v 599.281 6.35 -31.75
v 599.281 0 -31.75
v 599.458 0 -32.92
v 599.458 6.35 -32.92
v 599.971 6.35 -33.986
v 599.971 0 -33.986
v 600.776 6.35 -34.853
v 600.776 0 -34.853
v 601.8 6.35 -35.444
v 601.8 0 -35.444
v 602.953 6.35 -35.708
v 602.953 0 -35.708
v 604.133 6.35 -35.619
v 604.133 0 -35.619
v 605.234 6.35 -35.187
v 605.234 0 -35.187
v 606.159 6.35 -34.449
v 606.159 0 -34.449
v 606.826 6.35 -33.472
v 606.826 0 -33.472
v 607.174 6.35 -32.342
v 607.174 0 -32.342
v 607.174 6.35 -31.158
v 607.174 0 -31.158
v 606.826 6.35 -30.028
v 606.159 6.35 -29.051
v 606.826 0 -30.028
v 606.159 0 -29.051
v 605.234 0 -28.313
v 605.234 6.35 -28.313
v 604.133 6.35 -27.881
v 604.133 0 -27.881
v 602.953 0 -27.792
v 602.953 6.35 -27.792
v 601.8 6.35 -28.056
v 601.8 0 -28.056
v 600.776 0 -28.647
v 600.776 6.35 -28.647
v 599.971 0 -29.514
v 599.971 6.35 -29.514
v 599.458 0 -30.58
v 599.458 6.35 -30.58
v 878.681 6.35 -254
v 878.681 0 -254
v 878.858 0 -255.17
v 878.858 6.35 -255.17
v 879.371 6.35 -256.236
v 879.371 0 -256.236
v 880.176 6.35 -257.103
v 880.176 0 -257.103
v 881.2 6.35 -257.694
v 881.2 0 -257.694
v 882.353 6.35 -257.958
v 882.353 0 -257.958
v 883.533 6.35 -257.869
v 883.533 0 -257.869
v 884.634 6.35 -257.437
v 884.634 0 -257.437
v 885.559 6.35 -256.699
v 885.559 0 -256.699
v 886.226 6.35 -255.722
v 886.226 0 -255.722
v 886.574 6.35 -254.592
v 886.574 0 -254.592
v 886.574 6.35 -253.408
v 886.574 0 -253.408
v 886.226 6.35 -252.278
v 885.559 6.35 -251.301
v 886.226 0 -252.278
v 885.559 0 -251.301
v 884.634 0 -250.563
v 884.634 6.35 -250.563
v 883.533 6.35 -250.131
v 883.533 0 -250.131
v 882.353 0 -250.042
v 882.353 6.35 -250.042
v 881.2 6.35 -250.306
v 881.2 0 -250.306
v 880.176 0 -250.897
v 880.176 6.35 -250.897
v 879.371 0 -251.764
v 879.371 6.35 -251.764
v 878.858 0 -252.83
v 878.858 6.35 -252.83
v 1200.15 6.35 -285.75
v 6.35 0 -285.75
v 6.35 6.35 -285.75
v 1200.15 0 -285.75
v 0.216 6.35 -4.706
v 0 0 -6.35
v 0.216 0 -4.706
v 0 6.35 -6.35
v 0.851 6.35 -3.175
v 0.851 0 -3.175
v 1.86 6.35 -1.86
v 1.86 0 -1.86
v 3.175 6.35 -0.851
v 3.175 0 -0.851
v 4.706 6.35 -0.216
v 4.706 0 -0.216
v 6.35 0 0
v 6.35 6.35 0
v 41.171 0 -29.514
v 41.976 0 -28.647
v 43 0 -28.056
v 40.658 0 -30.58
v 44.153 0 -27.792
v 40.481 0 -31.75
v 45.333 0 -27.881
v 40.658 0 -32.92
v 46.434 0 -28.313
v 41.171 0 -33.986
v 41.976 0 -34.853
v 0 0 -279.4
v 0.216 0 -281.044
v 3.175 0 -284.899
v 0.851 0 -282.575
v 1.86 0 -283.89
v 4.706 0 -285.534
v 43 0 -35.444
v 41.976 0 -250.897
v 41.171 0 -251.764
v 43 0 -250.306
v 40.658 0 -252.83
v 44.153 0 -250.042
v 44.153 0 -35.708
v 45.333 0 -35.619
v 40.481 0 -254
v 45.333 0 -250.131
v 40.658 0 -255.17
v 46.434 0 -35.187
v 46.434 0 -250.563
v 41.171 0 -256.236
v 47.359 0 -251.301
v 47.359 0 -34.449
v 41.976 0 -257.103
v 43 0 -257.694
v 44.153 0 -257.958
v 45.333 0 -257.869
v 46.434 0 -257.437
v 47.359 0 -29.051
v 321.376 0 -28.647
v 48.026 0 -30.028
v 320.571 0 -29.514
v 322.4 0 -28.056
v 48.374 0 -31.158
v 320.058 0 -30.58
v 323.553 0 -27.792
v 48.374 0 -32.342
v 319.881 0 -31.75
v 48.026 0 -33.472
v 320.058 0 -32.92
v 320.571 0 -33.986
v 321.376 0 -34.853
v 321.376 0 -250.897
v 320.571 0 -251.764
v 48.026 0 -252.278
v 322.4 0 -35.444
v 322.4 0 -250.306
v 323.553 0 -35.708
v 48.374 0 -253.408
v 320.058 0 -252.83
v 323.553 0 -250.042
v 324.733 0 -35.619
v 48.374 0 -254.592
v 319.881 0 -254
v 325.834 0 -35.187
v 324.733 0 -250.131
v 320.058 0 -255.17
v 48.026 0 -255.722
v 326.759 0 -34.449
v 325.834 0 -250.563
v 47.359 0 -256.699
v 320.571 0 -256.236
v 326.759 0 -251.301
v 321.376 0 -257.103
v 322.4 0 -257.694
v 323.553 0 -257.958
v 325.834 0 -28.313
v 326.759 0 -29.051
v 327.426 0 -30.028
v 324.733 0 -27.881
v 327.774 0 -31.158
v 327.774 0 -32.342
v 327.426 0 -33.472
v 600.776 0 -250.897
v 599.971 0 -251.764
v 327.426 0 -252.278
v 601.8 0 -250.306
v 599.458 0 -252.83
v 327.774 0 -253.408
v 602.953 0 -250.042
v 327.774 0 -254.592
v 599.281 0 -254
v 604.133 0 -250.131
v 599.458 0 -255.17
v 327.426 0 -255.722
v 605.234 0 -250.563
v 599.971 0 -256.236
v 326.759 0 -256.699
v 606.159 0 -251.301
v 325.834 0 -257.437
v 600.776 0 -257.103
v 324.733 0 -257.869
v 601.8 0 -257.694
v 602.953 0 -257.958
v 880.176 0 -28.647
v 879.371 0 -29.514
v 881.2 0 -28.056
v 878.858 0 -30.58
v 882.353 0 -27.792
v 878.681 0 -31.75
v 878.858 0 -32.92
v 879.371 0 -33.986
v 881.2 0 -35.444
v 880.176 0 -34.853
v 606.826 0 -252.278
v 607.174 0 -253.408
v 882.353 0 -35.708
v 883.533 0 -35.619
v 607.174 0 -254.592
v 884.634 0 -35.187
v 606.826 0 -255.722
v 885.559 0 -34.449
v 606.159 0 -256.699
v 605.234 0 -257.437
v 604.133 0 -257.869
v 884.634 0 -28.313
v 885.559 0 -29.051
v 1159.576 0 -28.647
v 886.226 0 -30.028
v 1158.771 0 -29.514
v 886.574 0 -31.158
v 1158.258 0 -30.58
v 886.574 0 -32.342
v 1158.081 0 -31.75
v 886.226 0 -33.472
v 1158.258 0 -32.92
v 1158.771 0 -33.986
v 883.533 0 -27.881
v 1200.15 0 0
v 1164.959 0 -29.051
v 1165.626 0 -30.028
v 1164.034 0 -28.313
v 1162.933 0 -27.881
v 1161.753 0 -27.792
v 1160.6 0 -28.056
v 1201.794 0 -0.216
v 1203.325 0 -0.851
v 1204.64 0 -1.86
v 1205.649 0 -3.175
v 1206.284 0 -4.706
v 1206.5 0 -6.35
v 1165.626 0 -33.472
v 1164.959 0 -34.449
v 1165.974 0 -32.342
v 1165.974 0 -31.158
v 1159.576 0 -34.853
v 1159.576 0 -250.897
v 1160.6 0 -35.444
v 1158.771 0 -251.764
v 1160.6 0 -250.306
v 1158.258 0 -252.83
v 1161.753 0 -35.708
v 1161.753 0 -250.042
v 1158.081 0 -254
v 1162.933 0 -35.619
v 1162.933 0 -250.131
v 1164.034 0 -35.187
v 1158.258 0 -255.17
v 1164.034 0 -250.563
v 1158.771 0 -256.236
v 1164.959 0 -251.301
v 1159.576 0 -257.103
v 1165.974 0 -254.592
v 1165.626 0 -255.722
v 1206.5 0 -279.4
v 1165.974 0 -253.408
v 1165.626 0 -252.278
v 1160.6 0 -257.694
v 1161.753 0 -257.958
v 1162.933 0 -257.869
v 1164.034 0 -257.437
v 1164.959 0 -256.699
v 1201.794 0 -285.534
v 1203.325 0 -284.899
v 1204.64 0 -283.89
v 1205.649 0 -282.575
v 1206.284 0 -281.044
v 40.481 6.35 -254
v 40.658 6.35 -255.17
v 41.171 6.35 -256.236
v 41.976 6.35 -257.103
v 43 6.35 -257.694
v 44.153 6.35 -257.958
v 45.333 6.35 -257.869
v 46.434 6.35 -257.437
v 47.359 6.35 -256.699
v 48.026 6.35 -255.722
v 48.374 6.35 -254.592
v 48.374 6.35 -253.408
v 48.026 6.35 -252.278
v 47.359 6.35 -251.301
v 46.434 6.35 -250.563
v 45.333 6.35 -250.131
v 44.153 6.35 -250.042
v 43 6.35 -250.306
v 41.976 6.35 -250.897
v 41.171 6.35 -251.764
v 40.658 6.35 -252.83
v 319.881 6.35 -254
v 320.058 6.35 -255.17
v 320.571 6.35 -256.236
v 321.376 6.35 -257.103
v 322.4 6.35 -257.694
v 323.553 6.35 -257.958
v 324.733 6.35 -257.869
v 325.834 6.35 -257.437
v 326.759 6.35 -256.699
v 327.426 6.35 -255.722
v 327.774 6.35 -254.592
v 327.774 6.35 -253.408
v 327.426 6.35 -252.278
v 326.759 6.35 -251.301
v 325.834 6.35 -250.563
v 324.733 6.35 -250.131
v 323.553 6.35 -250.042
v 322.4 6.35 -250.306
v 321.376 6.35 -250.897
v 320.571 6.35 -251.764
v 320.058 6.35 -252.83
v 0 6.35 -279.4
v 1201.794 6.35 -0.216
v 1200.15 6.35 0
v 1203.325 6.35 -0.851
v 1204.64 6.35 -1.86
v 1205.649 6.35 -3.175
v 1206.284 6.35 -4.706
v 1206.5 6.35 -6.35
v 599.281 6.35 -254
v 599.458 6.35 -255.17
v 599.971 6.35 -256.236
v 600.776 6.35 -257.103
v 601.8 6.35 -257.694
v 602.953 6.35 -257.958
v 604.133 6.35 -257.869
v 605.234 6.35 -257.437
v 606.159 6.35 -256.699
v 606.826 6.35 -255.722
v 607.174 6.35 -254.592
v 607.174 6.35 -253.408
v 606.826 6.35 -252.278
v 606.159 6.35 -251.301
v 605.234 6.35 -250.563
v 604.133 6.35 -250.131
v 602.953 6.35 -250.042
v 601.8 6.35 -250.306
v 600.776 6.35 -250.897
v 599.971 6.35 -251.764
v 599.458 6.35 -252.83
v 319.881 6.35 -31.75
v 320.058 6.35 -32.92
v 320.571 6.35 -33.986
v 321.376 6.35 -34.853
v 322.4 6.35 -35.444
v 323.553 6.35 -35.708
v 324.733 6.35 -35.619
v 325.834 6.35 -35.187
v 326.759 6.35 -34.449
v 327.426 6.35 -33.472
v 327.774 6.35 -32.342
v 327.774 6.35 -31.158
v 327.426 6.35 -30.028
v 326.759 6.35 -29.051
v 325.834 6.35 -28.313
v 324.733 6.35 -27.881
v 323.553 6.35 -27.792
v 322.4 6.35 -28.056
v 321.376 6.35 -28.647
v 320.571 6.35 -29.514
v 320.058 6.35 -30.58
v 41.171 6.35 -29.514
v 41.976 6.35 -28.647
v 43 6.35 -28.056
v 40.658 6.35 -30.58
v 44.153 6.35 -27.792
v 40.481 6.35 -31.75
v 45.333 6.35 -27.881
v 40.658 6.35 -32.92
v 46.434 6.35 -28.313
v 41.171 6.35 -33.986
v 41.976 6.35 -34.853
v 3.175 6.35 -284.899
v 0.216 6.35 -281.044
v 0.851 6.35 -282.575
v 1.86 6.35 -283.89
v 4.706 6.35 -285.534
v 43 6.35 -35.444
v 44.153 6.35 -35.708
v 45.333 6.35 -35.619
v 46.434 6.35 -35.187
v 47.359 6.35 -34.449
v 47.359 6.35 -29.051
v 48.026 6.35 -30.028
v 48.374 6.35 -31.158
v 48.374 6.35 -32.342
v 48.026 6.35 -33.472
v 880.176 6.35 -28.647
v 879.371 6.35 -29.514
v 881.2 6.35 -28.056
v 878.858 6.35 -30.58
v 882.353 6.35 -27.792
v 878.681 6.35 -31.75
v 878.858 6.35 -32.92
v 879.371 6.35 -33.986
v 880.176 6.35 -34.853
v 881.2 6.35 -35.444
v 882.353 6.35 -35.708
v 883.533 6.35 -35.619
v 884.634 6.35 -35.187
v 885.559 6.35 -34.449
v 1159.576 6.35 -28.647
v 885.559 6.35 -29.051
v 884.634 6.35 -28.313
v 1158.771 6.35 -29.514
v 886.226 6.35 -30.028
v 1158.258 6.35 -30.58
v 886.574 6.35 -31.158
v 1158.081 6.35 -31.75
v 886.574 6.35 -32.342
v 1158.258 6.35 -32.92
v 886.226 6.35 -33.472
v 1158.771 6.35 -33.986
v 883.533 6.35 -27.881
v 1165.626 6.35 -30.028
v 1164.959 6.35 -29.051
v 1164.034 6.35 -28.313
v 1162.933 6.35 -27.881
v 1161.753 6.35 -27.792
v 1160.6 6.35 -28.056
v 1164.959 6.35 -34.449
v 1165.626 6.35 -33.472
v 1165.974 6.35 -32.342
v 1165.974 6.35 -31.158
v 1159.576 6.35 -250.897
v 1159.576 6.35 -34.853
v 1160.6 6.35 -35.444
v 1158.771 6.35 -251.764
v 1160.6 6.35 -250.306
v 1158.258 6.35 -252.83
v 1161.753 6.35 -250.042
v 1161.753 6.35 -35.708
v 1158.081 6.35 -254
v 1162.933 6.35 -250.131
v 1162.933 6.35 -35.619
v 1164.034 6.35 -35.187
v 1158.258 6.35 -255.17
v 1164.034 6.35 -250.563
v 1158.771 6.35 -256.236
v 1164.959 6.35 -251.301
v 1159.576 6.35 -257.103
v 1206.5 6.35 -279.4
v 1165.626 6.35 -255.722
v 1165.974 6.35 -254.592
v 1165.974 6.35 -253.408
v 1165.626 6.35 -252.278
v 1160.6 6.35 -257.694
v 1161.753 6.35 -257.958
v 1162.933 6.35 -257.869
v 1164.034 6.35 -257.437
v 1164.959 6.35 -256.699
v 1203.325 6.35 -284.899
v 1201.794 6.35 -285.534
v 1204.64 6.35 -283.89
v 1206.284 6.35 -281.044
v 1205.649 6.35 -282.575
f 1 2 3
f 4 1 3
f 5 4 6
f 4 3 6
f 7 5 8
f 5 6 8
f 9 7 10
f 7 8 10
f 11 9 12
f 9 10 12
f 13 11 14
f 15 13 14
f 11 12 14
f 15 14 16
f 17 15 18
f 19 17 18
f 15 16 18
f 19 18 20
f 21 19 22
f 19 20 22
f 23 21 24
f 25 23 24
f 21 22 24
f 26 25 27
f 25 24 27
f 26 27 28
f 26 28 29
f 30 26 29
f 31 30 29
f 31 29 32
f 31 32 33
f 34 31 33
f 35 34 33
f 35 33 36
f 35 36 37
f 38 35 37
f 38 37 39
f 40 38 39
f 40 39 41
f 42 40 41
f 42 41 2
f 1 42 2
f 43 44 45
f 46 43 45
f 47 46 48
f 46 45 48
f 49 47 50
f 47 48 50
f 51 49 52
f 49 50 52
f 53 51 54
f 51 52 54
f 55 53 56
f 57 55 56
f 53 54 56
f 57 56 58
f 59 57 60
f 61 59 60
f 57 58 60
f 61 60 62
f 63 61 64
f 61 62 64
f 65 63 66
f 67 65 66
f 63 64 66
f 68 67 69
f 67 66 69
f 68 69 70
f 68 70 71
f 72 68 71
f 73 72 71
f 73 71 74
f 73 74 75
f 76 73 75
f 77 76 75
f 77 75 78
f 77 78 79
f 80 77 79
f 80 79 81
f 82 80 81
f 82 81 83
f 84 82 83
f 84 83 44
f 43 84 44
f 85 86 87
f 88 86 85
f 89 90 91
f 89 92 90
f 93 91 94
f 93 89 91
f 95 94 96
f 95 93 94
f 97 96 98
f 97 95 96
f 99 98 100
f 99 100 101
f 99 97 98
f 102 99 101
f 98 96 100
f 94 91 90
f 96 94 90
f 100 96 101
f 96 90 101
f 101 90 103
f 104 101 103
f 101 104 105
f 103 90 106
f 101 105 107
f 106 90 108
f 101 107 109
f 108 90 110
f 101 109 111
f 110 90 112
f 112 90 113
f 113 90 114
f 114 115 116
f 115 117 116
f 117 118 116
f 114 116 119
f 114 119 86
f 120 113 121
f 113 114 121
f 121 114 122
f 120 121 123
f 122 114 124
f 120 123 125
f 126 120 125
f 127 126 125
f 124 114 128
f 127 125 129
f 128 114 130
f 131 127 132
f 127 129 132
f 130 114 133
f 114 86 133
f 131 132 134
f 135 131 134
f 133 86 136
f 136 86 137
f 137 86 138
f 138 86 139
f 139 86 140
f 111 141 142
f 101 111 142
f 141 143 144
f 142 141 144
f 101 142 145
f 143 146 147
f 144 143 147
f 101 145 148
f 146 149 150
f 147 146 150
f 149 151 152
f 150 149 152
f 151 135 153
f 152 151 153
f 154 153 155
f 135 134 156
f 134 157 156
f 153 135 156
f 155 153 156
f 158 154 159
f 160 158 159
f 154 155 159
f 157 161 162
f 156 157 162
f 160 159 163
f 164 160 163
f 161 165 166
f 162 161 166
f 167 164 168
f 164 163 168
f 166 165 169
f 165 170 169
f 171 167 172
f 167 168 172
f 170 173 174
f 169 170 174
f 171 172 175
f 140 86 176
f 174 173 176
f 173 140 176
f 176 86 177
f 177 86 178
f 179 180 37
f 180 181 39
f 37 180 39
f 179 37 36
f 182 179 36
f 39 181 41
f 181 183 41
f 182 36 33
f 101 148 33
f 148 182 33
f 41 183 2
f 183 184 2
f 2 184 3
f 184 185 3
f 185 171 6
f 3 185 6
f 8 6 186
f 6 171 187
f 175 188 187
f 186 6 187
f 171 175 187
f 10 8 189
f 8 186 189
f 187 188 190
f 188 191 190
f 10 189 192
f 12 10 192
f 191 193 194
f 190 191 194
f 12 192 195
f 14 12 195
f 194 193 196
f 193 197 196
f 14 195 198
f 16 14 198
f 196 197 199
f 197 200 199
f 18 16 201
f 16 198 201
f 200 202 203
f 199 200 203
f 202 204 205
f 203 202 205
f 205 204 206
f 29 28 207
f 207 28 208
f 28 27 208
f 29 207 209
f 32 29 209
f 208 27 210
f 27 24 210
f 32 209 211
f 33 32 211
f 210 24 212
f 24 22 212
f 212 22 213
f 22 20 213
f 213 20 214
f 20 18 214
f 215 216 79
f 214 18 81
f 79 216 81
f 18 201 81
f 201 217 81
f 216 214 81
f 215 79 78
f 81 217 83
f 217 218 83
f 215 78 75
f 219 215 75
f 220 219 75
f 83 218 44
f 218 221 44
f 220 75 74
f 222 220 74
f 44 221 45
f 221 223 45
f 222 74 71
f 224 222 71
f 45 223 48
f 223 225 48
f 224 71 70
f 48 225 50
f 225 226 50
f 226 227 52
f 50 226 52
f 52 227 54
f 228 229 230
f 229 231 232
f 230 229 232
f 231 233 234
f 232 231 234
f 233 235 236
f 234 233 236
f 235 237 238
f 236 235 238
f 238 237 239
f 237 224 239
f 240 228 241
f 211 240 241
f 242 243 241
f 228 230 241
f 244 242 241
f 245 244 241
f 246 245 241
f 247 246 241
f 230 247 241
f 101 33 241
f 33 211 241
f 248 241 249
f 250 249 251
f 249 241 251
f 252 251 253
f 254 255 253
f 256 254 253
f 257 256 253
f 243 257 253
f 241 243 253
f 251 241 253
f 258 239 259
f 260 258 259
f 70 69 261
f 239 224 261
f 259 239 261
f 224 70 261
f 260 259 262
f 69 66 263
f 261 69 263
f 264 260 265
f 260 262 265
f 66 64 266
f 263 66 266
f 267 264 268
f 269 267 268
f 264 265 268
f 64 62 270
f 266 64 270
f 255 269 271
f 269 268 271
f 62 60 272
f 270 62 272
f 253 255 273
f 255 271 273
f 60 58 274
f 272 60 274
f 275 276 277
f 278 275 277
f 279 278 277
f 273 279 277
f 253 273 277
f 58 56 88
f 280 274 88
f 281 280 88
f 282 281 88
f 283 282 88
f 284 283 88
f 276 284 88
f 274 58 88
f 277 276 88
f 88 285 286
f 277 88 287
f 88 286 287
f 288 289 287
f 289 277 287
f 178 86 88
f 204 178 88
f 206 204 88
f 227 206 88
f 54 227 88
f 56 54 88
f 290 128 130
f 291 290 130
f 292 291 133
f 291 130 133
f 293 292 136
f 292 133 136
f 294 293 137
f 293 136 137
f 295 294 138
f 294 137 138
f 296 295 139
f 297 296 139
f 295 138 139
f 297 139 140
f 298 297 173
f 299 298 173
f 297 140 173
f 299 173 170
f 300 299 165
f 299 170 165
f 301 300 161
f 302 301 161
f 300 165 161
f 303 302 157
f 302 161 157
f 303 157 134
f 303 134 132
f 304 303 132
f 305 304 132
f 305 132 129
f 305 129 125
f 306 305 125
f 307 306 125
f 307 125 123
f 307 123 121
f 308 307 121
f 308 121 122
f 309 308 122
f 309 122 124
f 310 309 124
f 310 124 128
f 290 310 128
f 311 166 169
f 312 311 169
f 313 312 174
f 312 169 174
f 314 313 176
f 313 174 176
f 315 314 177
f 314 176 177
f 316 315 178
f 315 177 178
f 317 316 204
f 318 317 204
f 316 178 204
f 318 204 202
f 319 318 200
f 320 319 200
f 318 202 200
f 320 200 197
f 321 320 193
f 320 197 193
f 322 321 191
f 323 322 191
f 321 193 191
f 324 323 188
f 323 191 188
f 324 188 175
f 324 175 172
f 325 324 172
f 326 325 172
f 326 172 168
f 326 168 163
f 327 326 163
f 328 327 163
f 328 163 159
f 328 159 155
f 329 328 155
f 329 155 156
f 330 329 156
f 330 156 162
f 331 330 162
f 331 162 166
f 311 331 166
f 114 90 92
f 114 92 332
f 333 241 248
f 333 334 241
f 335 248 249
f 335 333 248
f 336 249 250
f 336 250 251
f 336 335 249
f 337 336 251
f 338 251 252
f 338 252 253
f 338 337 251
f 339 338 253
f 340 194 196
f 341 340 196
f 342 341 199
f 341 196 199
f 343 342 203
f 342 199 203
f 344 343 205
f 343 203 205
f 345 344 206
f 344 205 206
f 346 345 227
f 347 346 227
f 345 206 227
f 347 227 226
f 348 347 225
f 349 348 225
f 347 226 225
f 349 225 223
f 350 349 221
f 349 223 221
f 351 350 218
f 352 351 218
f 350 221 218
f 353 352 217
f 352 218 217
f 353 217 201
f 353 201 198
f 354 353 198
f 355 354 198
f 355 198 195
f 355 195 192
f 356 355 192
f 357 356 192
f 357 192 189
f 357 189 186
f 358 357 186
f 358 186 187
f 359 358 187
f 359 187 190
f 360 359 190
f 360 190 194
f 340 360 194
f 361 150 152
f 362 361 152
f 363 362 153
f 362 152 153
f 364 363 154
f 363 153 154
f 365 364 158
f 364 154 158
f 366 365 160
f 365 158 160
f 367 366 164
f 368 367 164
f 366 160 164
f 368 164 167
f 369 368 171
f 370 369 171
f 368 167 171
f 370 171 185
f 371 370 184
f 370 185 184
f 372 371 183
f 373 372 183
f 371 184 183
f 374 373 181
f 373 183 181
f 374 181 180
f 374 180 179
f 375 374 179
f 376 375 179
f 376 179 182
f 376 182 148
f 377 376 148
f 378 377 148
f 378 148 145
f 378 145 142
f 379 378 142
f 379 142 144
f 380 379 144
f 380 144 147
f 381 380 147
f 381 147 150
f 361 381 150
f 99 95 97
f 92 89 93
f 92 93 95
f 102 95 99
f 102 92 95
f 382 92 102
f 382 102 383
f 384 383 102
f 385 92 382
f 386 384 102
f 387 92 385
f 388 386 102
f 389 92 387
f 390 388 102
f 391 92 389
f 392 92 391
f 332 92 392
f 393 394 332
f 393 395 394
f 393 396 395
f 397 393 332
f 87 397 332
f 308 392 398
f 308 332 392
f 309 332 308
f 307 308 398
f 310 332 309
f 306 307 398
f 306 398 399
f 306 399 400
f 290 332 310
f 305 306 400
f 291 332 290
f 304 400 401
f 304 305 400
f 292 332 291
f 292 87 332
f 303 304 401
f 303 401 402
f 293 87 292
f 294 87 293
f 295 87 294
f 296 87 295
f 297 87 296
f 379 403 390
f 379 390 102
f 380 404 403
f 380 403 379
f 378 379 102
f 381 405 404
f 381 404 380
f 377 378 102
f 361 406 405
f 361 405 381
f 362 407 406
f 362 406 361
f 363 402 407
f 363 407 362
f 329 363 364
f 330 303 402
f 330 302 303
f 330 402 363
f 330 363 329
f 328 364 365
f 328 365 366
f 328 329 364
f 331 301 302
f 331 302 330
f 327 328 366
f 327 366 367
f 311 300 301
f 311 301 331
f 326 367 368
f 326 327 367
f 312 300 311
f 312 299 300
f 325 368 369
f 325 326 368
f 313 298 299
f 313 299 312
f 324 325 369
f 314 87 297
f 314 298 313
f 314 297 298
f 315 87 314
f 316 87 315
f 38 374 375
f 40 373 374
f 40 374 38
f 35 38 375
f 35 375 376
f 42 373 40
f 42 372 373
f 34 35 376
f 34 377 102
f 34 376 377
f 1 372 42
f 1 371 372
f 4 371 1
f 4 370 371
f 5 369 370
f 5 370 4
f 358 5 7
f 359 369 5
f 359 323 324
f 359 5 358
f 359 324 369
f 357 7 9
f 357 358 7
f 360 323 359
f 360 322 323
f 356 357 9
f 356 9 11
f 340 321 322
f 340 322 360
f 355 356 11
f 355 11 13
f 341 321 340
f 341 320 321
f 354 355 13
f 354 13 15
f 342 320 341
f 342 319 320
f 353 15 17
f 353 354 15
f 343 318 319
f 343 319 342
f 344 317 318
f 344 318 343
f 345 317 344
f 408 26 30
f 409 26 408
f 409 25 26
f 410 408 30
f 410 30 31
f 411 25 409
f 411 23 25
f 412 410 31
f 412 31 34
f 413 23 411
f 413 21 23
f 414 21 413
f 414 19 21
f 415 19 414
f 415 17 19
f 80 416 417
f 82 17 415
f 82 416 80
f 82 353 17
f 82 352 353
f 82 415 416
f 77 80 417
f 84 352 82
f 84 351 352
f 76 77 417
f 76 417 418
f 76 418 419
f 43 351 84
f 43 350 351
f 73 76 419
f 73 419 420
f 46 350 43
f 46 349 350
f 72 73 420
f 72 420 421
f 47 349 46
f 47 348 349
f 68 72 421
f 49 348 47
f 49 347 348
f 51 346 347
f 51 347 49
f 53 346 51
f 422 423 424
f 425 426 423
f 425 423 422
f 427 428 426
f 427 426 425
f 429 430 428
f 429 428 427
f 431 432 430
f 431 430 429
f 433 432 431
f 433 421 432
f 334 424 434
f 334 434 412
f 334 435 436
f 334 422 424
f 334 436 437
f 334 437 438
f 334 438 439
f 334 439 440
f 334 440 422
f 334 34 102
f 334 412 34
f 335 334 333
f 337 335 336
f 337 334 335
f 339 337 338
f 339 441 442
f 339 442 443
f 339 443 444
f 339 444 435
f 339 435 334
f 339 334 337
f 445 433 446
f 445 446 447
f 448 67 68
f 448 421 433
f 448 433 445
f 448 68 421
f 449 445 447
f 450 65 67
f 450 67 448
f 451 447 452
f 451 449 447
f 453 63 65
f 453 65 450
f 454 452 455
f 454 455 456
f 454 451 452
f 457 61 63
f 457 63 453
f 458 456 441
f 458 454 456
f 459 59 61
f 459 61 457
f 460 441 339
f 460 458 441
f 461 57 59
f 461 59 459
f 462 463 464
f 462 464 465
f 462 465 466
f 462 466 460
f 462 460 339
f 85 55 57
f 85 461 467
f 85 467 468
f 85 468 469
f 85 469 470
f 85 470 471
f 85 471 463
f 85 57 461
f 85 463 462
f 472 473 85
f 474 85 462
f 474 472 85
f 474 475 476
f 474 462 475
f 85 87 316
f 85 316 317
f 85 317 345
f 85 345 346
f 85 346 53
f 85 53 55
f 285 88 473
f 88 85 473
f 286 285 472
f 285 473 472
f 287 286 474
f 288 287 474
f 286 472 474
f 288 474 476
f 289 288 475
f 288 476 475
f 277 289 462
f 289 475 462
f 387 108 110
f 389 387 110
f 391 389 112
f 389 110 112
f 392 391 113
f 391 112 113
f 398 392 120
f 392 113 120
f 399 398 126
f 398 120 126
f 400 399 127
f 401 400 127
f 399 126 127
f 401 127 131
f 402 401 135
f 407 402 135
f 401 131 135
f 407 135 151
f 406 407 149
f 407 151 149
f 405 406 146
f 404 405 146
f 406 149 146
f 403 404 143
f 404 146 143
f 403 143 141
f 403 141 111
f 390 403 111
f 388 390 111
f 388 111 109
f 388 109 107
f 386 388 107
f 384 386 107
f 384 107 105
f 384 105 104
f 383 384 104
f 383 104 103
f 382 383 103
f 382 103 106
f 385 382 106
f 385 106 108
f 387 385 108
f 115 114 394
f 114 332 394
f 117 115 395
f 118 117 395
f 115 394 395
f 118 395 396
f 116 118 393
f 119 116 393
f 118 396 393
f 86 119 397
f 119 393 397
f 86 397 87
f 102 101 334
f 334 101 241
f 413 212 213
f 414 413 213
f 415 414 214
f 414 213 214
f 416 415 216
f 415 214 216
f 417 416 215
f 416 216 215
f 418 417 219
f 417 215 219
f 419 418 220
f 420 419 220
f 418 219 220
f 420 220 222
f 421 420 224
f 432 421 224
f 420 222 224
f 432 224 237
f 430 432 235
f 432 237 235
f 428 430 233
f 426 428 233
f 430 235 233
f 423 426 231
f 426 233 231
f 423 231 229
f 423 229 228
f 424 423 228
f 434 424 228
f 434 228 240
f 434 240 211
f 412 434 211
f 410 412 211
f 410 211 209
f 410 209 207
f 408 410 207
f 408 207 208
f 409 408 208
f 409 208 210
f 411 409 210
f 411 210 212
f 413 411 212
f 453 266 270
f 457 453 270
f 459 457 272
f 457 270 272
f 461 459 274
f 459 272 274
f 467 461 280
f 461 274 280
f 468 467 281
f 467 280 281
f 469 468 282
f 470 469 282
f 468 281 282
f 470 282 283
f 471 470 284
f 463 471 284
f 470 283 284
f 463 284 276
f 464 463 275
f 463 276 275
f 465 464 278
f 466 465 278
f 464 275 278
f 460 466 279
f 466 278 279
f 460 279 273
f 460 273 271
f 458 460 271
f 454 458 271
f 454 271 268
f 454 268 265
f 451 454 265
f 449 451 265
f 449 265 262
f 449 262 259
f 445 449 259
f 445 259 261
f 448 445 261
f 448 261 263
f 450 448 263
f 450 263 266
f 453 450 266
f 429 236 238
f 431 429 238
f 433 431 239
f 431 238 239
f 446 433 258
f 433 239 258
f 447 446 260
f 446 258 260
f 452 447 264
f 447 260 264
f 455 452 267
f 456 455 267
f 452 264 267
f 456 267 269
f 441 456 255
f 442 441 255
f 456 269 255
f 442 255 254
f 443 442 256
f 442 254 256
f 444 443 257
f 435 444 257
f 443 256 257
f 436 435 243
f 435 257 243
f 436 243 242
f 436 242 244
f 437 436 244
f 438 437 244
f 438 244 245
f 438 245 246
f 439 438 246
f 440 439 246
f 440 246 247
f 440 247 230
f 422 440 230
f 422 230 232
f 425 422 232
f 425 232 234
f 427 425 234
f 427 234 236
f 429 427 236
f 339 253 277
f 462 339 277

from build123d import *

# Parameters (mm, degrees)
SKETCH1_W                      = 1206.5
SKETCH1_H                      = 285.75
BOSS_EXTRUDE1_DEPTH            = 6.35
F_5_16_0_3125_DIAMETER_HOLE1_D = 7.9375
LPATTERN1_COUNT                = 5
LPATTERN1_PITCH                = 279.4
LPATTERN1_COUNT_DIR2           = 2
LPATTERN1_PITCH_DIR2           = 222.25
FILLET1_R                      = 6.35


with BuildPart() as part:
    # Sketch1 → Boss-Extrude1 (new body)
    with BuildSketch(Plane(origin=(0, 0, 0), x_dir=(1, 0, 0), z_dir=(0, 1, 0))):
        with Locations((603.25, 142.875)):
            Rectangle(SKETCH1_W, SKETCH1_H)
    extrude(amount=BOSS_EXTRUDE1_DEPTH)

    # 5/16 (0.3125) Diameter Hole1 (through all)
    with Locations(Plane(origin=(0, 6.35, 0), x_dir=(1, 0, 0), z_dir=(0, 1, 0))):
        with Locations((44.45, 31.75)):
            f_5_16_0_3125_diameter_hole1 = Hole(F_5_16_0_3125_DIAMETER_HOLE1_D / 2)

    # LPattern1: 5_16 _0.3125_ Diameter Hole1 5 × 2
    with Locations(*[(i * LPATTERN1_PITCH, 0, -j * LPATTERN1_PITCH_DIR2) for i in range(LPATTERN1_COUNT) for j in range(LPATTERN1_COUNT_DIR2) if (i, j) != (0, 0)]):
        add(f_5_16_0_3125_diameter_hole1, mode=Mode.SUBTRACT)

    # Fillet1
    fillet1_edges = [part.edges().sort_by_distance(p)[0] for p in [
        (0, 3.175, -285.75),
        (1206.5, 3.175, -285.75),
        (1206.5, 3.175, 0),
        (0, 3.175, 0),
    ]]
    fillet(fillet1_edges, radius=FILLET1_R)


solid = part.part
